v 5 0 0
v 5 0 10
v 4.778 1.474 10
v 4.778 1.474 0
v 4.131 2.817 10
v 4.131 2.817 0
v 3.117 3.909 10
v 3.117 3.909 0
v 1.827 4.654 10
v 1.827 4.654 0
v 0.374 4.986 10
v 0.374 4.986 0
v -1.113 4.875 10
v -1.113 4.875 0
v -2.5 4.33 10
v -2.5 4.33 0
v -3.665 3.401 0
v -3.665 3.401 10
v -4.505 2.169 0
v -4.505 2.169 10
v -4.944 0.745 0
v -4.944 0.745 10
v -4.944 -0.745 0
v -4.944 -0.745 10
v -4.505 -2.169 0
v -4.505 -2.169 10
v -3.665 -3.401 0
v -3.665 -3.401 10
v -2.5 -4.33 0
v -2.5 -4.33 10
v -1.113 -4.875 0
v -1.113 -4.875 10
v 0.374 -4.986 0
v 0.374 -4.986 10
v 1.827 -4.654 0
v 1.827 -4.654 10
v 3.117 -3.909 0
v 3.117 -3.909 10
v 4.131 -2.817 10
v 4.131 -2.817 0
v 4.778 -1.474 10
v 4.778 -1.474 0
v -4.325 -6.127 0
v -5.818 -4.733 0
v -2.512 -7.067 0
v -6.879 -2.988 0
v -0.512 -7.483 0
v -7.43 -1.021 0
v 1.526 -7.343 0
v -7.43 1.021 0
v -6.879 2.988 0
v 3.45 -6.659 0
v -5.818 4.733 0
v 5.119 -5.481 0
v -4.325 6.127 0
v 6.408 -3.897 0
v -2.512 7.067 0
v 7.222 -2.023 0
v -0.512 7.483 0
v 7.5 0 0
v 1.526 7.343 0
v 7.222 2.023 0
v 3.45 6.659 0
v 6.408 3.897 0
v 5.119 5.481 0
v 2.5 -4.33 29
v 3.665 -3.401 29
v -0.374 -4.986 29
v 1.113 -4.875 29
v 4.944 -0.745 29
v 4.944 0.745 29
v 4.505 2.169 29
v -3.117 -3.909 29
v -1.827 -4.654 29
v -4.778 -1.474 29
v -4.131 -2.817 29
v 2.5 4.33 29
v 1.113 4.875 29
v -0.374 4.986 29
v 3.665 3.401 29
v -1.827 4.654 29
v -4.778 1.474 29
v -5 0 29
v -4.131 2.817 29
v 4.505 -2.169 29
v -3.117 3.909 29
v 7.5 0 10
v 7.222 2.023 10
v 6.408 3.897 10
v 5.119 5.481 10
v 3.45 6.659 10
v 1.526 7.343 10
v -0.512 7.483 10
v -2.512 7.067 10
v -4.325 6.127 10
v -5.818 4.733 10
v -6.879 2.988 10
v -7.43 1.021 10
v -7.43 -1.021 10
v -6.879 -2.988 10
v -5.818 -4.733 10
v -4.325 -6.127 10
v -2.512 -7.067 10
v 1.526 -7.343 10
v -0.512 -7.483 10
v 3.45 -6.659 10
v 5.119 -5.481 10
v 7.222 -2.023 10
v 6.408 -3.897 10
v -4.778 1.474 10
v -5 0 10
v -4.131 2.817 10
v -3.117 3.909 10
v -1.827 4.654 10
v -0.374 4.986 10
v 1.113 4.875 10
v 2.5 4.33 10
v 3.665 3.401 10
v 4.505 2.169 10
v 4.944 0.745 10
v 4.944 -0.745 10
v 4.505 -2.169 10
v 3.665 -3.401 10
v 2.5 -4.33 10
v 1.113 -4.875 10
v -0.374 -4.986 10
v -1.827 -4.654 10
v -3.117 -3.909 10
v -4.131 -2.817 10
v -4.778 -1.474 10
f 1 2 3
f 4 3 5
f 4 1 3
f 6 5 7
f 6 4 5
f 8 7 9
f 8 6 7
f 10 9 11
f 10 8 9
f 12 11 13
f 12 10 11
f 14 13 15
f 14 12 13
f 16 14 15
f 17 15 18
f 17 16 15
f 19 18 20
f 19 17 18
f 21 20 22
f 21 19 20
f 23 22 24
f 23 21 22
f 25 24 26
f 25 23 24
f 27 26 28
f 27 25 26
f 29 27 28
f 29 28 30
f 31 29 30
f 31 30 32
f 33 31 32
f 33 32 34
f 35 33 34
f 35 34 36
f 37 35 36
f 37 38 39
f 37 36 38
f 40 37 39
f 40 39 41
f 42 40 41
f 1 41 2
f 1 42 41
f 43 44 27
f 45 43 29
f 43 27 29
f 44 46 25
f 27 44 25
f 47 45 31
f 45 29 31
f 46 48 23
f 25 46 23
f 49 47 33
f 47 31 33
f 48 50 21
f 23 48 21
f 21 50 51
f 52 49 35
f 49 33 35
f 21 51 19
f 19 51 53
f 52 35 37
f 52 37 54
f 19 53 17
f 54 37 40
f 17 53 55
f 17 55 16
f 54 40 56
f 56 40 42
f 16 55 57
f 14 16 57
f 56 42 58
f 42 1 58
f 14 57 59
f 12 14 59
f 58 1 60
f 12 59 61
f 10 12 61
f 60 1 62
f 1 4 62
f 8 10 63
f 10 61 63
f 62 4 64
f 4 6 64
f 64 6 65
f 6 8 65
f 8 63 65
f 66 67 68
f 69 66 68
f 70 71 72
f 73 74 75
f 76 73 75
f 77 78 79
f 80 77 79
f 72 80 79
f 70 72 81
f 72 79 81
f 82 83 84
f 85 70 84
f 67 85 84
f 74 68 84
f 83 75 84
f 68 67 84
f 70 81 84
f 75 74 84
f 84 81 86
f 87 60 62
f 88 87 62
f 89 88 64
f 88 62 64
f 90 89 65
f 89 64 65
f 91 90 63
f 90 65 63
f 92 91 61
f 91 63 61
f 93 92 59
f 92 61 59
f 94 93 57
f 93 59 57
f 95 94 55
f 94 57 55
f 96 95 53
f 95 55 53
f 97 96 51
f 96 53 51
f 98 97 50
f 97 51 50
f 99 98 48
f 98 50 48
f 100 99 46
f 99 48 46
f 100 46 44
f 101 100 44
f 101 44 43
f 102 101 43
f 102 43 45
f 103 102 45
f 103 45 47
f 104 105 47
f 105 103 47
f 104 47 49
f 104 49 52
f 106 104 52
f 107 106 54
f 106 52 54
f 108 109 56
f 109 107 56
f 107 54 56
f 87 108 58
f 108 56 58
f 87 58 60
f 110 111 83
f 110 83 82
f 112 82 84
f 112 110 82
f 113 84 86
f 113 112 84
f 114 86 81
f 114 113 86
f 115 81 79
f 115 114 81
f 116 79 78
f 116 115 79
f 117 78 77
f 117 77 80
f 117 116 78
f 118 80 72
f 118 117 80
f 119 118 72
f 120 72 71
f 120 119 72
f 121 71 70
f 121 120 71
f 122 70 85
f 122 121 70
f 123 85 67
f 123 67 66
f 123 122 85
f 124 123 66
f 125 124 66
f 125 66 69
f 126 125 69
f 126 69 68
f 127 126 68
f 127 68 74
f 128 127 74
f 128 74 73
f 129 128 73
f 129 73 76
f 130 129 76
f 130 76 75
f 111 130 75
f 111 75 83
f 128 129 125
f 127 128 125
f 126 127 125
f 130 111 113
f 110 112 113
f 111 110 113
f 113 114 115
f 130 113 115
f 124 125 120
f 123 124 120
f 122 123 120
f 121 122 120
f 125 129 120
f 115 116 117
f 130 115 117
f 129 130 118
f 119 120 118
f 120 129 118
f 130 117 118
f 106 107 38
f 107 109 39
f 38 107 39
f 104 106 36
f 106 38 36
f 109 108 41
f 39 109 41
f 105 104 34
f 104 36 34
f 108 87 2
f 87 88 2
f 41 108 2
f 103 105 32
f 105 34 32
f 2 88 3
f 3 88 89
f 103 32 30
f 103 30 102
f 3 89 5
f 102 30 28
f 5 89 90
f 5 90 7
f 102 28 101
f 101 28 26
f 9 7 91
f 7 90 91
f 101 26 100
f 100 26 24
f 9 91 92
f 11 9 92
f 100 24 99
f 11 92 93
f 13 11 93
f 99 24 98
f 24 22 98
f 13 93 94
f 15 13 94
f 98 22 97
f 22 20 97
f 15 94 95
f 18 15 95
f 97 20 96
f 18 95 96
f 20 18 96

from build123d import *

# Parameters (mm, degrees)
SKETCH1_R           = 7.5
BOSS_EXTRUDE1_DEPTH = 250
SKETCH2_R           = 5
CUT_EXTRUDE1_DEPTH  = 10
SKETCH3_R           = 9.435011435
SKETCH3_R_2         = 5
CUT_EXTRUDE2_DEPTH  = 19
SKETCH5_R           = 25.765699078
CUT_EXTRUDE3_DEPTH  = 221


with BuildPart() as part:
    # Sketch1 → Boss-Extrude1 (new body)
    with BuildSketch(Plane.XY):
        Circle(SKETCH1_R)
    extrude(amount=BOSS_EXTRUDE1_DEPTH)

    # Sketch2 → Cut-Extrude1 (cut)
    with BuildSketch(Plane.XY):
        Circle(SKETCH2_R)
    extrude(amount=CUT_EXTRUDE1_DEPTH, mode=Mode.SUBTRACT)

    # Sketch3 → Cut-Extrude2 (cut)
    with BuildSketch(Plane(origin=(0, 0, 10), x_dir=(-1, 0, 0), z_dir=(0, 0, -1))):
        Circle(SKETCH3_R)
        Circle(SKETCH3_R_2, mode=Mode.SUBTRACT)
    extrude(amount=-CUT_EXTRUDE2_DEPTH, mode=Mode.SUBTRACT)


with BuildPart() as cut_extrude2_piece_1:
    # of the separate pieces the step leaves, piece 1, a body of its own (cut_extrude2_pieces)
    add(part.part.solids().sort_by_distance((7.5, 0, 29))[0])

    # Sketch5 → Cut-Extrude3 (cut)
    with BuildSketch(Plane(origin=(0, 0, 29), x_dir=(-1, 0, 0), z_dir=(0, 0, -1))):
        Circle(SKETCH5_R)
    extrude(amount=-CUT_EXTRUDE3_DEPTH, mode=Mode.SUBTRACT)


with BuildPart() as cut_extrude2_piece_2:
    # of the separate pieces the step leaves, piece 2, a body of its own (cut_extrude2_pieces)
    add(part.part.solids().sort_by_distance((7.5, 0, 0))[0])


solid = Compound([cut_extrude2_piece_1.part, cut_extrude2_piece_2.part])
